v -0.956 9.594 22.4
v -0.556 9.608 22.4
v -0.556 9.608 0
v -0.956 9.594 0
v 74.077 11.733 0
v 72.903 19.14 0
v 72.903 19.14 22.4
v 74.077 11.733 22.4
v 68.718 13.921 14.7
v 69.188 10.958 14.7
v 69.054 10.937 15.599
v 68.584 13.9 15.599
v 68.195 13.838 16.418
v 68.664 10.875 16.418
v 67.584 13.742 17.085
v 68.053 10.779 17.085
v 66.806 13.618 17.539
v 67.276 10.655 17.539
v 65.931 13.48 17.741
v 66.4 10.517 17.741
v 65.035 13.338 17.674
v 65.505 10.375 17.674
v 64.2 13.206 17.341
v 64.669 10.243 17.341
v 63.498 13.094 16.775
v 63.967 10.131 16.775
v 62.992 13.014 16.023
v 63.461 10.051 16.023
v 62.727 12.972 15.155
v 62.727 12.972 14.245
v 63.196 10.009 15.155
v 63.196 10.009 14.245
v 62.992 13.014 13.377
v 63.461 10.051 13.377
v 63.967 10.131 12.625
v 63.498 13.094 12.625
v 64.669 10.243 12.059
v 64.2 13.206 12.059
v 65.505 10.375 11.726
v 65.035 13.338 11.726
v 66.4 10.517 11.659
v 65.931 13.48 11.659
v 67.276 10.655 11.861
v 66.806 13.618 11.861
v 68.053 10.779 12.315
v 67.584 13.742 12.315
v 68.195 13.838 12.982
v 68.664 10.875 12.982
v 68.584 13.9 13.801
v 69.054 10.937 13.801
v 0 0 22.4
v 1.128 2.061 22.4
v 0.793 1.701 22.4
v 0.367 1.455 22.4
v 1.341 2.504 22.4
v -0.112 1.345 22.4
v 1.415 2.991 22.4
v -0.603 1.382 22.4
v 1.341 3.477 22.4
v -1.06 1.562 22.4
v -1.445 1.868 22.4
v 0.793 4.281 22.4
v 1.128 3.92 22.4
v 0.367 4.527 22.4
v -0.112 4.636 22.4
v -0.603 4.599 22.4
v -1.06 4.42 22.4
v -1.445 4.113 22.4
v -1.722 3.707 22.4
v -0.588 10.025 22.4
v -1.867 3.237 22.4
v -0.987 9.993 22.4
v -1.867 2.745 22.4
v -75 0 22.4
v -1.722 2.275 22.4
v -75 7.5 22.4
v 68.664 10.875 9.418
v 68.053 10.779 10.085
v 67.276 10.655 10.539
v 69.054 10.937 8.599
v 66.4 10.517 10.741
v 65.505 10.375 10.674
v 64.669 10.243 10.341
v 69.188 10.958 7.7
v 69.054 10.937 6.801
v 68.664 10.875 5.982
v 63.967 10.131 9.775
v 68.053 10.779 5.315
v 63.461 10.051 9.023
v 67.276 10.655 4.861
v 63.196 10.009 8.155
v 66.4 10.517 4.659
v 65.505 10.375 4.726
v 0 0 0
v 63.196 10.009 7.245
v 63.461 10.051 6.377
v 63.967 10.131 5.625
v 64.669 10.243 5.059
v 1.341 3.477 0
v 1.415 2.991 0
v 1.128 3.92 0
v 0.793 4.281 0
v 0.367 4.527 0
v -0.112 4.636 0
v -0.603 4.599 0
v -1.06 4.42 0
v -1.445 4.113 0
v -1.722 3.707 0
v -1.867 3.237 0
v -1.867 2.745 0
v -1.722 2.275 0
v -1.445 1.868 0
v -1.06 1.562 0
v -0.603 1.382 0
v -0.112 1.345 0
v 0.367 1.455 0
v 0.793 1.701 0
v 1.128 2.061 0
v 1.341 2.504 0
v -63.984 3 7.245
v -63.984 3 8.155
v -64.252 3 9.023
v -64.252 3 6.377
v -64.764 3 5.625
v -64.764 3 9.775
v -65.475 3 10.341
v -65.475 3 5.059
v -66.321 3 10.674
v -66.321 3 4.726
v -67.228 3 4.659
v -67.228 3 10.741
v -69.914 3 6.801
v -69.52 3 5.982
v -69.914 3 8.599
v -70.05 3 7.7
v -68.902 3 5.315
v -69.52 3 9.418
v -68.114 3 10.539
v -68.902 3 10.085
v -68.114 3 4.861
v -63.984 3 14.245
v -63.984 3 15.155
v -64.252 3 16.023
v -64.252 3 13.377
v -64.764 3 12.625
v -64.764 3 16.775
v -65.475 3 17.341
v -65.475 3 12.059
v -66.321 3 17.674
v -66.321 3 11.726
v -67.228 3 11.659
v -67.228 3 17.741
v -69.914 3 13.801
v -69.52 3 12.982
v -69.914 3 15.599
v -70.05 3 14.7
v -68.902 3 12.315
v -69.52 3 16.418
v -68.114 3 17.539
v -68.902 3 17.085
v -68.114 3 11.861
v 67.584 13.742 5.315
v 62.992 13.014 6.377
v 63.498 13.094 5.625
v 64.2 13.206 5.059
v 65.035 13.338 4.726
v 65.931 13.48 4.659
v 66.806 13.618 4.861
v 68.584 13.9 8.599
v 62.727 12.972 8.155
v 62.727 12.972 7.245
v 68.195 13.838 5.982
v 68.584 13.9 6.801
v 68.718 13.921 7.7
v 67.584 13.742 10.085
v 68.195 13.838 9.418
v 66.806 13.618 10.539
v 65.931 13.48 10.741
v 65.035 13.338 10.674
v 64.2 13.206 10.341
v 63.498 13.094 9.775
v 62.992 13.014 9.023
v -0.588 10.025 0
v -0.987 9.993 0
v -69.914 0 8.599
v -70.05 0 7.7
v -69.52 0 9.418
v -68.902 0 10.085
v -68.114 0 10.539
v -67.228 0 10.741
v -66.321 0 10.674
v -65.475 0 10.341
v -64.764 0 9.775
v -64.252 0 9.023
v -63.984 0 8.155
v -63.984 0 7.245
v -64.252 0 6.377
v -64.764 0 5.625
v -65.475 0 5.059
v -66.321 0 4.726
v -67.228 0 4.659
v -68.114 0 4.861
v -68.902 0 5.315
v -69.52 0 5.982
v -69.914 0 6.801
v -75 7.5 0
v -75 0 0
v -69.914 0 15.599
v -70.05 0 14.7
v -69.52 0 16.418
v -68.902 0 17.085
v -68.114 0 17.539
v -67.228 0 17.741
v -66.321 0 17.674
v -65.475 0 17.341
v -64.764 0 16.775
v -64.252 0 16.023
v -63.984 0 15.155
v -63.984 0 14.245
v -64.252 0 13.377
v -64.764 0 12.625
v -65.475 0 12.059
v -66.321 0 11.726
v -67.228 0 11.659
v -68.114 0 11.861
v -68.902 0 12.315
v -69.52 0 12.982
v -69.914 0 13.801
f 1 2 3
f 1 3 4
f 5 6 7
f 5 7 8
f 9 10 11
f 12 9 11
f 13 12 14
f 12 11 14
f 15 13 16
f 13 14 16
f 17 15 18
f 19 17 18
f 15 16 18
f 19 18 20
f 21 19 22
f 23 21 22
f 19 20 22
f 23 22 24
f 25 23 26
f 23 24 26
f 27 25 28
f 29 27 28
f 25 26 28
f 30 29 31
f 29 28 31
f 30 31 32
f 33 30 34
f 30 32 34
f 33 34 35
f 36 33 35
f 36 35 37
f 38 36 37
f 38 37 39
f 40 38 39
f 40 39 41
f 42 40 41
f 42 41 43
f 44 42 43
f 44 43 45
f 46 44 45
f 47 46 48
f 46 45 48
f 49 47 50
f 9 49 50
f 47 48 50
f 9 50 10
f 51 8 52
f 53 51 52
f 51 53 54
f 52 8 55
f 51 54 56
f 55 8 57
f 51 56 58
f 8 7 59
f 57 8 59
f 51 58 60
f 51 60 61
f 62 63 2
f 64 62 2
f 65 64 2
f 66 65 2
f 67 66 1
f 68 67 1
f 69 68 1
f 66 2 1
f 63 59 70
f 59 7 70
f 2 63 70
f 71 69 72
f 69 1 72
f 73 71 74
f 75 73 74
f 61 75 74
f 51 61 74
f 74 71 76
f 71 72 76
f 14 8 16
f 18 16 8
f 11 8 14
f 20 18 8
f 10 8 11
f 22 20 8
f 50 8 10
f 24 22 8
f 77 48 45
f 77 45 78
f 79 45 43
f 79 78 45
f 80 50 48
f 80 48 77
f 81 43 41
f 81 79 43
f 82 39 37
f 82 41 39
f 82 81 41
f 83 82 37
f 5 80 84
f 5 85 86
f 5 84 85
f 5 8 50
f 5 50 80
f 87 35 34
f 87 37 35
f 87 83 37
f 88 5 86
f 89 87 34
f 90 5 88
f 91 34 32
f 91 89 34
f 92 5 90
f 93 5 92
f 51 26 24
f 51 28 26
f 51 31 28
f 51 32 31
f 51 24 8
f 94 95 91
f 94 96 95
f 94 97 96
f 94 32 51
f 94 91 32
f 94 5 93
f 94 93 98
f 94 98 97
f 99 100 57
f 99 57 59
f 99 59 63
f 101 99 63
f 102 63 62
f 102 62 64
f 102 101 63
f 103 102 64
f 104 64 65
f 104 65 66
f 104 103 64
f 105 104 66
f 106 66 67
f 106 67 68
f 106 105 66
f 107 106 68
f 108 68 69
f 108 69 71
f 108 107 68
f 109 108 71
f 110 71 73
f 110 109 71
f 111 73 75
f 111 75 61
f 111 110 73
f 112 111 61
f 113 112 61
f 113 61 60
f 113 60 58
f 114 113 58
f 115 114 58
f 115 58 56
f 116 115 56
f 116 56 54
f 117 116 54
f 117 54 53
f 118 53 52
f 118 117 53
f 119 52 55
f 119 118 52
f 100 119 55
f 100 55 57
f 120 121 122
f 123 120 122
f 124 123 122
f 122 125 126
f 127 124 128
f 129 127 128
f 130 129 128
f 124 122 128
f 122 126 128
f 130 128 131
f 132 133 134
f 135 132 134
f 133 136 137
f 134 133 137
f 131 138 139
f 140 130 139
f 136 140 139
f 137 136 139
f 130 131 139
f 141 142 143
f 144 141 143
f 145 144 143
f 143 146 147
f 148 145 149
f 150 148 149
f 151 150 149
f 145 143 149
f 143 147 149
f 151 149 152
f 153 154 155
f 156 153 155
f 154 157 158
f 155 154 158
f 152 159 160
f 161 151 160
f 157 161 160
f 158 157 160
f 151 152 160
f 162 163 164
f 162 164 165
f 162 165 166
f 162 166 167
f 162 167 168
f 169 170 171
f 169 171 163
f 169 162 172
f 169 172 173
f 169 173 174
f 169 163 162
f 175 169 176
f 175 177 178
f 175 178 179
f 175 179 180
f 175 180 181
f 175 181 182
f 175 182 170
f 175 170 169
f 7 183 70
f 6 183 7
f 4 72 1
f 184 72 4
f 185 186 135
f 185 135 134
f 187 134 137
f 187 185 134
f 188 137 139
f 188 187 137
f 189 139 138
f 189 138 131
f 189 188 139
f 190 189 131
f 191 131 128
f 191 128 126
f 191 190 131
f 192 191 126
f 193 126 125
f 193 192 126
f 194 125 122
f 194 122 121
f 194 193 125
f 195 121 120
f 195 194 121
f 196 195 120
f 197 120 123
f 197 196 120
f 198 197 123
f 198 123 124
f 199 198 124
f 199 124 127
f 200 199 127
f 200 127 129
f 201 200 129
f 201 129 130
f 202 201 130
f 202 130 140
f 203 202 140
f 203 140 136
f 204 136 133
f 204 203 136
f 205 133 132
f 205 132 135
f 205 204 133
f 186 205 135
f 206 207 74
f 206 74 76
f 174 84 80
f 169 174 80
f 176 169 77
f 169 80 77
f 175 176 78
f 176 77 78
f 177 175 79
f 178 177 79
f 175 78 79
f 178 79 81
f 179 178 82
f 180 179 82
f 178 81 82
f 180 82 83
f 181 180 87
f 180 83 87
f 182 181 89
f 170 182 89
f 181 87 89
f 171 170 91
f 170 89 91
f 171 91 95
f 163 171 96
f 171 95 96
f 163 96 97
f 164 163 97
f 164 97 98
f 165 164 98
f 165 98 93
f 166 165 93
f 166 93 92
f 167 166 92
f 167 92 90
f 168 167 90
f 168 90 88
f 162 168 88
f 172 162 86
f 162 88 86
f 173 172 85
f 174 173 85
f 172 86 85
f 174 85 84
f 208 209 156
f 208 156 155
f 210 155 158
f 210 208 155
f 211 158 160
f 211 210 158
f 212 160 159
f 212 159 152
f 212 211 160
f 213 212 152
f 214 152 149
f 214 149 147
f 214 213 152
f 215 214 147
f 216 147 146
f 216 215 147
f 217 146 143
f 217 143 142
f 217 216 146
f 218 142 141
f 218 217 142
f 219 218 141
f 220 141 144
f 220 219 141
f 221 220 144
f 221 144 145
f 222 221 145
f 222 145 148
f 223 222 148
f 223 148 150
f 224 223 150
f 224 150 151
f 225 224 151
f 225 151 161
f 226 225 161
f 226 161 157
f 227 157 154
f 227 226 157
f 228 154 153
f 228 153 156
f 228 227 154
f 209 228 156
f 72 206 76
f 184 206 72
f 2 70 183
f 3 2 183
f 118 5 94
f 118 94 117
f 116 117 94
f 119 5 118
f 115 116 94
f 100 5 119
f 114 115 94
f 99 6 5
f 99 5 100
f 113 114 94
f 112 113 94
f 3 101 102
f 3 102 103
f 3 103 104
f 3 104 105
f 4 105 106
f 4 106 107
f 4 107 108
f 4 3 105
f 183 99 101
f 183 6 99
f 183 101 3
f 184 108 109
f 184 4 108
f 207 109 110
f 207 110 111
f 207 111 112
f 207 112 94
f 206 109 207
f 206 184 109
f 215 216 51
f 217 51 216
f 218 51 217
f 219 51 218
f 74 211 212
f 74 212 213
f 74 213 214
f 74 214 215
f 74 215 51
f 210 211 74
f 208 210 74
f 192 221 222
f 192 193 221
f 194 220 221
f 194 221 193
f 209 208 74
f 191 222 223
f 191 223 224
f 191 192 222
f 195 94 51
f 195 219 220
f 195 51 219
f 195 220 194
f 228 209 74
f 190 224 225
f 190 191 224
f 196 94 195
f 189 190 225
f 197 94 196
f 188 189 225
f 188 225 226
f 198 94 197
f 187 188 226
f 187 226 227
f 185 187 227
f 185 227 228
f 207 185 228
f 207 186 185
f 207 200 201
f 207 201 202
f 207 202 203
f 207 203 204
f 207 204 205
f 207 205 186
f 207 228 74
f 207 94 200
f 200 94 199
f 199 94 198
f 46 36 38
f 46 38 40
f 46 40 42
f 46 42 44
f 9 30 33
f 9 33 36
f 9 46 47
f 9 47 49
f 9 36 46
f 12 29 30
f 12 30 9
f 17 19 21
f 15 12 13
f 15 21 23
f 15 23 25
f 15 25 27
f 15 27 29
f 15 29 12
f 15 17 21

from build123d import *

# Parameters (mm, degrees)
SKETCH1_R           = 1.65
BOSS_EXTRUDE1_DEPTH = 22.4
SKETCH2_R           = 3.05
CUT_EXTRUDE1_DEPTH  = 3
CUT_EXTRUDE2_REACH  = 81.517
SKETCH3_W           = 0.4
SKETCH3_H           = 22.4


with BuildPart() as part:
    # Sketch1 → Boss-Extrude1 (new body)
    with BuildSketch(Plane.XY):
        Polygon((0, 0), (-75, 0), (-75, 7.5), (-0.787017068, 10), (72.903367057, 19.140247432), (74.076625545, 11.732584878), align=None)
        with Locations((-0.235377287, 2.990752001)):
            Circle(SKETCH1_R, mode=Mode.SUBTRACT)
    extrude(amount=BOSS_EXTRUDE1_DEPTH)

    # Sketch2 → Cut-Extrude1 (cut)
    with BuildSketch(Plane(origin=(0, 0, 0), x_dir=(0.9876883405951377, 0.15643446504023117, 0), z_dir=(0.1564344650402312, -0.9876883405951378, 0))):
        with Locations((67, 14.7)):
            Circle(SKETCH2_R)
        with Locations((67, 7.7)):
            Circle(SKETCH2_R)
    cut_extrude1 = extrude(amount=-CUT_EXTRUDE1_DEPTH, mode=Mode.SUBTRACT)

    # Mirror1: Cut-Extrude1 across plane
    add(cut_extrude1.mirror(Plane(origin=(0, 0, 0), x_dir=(0, 0, 1), z_dir=(0.9969173337331281, 0.07845909572784505, 0))), mode=Mode.SUBTRACT)

    # Cut-Extrude2: up to this plane
    cut_extrude2_end = Plane(origin=(-0.773549976, 9.600226767, 22.4), z_dir=(0.03366773042207346, -0.9994330812656876, 0))
    # Sketch3 → Cut-Extrude2 (cut, up to the surface)
    with BuildSketch(Plane(origin=(-1.048316472, 13.320123716, 0), x_dir=(0.9969173337331281, 0.07845909572784511, 0), z_dir=(-0.07845909572784511, 0.9969173337331281, 0)), mode=Mode.PRIVATE) as cut_extrude2_sk1:
        with Locations((0, -11.2)):
            Rectangle(SKETCH3_W, SKETCH3_H)
    cut_extrude2_tool1 = split(extrude(cut_extrude2_sk1.sketch, amount=-CUT_EXTRUDE2_REACH, mode=Mode.PRIVATE), bisect_by=cut_extrude2_end, keep=Keep.BOTH, mode=Mode.PRIVATE)
    add(cut_extrude2_tool1.solids().sort_by_distance((-1.048316, 13.320124, 11.2))[0], mode=Mode.SUBTRACT)


solid = part.part
